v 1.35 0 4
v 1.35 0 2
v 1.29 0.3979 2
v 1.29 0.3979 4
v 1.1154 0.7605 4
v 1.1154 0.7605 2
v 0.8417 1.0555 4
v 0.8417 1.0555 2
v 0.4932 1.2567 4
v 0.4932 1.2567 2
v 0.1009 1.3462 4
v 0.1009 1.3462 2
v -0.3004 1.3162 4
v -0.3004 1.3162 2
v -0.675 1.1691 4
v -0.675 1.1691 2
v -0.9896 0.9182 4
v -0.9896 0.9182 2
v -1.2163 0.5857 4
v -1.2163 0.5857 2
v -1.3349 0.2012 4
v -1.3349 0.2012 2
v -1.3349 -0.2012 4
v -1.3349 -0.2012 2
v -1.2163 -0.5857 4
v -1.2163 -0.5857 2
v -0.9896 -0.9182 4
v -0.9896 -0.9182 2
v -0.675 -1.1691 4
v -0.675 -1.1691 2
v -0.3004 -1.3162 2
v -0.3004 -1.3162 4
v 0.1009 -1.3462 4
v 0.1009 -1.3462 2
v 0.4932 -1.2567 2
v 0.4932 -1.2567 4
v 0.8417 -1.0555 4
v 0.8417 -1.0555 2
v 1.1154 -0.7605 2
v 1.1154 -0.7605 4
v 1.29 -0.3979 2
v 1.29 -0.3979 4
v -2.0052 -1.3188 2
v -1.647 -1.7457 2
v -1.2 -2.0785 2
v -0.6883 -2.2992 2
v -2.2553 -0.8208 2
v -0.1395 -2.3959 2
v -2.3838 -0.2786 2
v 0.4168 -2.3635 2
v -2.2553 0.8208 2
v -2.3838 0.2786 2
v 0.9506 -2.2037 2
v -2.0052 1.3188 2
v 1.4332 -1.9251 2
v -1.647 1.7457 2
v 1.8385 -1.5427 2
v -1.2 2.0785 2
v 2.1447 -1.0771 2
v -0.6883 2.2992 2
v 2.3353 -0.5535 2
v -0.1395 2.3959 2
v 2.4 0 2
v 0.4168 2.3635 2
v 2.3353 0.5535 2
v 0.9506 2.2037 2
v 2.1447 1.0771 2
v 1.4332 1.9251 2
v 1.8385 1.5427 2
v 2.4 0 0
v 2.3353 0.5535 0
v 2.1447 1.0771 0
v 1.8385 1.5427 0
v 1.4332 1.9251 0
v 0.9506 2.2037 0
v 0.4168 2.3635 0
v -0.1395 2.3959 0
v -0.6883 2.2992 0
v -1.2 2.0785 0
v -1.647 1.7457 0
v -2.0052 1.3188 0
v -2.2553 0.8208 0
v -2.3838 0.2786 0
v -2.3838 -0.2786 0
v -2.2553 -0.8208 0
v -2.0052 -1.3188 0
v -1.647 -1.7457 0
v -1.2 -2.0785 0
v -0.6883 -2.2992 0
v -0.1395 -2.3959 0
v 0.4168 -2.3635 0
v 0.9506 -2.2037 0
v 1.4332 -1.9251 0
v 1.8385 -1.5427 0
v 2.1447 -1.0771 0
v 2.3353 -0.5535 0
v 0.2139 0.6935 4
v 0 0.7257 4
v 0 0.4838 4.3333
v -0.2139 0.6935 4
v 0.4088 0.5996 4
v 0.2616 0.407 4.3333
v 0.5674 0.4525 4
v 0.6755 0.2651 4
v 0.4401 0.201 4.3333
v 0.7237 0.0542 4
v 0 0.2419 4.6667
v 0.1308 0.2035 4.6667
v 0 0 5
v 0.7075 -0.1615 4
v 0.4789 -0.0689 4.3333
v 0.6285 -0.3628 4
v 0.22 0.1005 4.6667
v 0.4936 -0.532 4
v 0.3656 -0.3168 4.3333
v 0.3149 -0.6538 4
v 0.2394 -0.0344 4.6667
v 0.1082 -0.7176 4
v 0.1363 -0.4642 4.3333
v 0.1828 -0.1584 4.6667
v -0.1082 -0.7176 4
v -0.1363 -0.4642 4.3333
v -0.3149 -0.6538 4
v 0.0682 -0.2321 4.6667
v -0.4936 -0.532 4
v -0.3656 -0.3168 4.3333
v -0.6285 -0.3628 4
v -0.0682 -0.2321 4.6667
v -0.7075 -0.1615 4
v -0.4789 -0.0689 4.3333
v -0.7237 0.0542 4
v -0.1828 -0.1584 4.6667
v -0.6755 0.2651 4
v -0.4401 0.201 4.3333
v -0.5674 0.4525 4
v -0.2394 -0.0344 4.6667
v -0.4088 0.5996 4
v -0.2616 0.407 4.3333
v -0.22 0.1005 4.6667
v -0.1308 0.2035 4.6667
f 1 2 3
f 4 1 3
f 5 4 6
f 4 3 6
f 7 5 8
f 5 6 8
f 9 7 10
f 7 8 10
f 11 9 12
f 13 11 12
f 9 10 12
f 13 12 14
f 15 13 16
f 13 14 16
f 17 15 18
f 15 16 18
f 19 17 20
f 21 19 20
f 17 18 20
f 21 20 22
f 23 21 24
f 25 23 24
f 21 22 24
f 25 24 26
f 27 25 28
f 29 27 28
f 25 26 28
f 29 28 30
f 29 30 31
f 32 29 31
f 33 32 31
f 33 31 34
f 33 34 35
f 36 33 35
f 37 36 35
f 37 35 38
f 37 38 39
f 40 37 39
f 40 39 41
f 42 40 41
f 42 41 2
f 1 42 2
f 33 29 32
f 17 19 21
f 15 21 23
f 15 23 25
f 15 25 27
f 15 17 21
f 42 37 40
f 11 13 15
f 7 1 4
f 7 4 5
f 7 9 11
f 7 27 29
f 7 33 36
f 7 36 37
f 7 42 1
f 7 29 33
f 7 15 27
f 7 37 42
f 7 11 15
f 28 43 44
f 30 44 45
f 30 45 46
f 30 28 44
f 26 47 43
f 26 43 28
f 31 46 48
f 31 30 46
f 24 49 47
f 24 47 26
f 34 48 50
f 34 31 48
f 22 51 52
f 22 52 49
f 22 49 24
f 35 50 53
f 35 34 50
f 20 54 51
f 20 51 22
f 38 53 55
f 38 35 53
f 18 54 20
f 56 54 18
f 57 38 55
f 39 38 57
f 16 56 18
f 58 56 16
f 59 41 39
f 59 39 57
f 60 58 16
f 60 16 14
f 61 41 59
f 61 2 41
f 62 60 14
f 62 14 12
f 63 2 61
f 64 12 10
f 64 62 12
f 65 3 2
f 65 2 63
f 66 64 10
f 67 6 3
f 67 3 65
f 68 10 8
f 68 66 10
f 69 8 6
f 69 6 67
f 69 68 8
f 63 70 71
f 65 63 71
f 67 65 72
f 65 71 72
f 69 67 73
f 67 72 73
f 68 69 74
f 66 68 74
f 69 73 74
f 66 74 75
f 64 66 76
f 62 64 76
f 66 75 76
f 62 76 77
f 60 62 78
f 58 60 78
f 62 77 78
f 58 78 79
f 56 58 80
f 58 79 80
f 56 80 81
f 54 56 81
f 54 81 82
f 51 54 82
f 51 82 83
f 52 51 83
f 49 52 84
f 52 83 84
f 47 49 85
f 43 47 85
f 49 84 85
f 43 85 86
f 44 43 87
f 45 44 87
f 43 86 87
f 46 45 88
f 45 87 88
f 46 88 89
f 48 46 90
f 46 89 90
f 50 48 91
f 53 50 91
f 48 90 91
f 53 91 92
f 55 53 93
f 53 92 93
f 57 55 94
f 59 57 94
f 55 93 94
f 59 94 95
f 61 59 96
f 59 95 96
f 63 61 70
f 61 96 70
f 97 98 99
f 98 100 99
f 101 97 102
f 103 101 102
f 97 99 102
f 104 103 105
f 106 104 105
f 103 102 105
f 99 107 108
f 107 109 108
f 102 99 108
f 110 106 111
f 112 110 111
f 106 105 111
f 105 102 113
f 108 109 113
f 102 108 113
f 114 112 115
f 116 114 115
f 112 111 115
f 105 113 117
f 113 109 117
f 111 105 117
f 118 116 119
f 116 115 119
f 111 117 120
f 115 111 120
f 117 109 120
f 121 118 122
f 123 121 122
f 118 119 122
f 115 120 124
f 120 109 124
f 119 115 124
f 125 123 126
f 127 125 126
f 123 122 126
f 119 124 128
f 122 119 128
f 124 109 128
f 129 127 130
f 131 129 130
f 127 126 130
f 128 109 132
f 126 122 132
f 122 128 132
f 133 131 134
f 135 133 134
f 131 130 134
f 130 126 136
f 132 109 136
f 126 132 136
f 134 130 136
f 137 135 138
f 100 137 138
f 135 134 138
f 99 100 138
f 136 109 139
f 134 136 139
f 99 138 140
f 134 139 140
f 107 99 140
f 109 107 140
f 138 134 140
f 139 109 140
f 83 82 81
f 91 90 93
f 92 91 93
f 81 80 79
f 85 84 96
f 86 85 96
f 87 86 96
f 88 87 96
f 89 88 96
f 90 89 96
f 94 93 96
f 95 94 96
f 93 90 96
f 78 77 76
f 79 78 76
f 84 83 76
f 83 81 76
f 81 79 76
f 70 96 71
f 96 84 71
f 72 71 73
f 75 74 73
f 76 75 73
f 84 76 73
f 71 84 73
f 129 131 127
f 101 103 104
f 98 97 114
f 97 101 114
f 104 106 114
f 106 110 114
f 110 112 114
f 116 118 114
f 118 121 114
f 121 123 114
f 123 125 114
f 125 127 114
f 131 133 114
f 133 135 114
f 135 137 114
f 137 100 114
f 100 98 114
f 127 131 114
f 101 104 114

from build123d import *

# Parameters (mm, degrees)
F0_R     = 1.35
F1_DEPTH = 4
F0_R_2   = 2.4
F2_DEPTH = 2


with BuildPart() as f1:
    # F0 (on Top) → F1 (new body)
    with BuildSketch(Plane.XY):
        Circle(F0_R)
    extrude(amount=F1_DEPTH)

    # F0 (on Top) → F2 (join)
    with BuildSketch(Plane.XY):
        Circle(F0_R_2)
        Circle(F0_R, mode=Mode.SUBTRACT)
    extrude(amount=F2_DEPTH)


with BuildPart() as f5:
    # F4 (on Right) → F5 (revolve)
    with BuildSketch(Plane.YZ):
        Polygon((0, 5), (0, 4), (0.725698, 4), align=None)
    revolve(axis=Axis((0, 0, 4.5), (0, 0, -1)))


solid = Compound([f1.part, f5.part])
